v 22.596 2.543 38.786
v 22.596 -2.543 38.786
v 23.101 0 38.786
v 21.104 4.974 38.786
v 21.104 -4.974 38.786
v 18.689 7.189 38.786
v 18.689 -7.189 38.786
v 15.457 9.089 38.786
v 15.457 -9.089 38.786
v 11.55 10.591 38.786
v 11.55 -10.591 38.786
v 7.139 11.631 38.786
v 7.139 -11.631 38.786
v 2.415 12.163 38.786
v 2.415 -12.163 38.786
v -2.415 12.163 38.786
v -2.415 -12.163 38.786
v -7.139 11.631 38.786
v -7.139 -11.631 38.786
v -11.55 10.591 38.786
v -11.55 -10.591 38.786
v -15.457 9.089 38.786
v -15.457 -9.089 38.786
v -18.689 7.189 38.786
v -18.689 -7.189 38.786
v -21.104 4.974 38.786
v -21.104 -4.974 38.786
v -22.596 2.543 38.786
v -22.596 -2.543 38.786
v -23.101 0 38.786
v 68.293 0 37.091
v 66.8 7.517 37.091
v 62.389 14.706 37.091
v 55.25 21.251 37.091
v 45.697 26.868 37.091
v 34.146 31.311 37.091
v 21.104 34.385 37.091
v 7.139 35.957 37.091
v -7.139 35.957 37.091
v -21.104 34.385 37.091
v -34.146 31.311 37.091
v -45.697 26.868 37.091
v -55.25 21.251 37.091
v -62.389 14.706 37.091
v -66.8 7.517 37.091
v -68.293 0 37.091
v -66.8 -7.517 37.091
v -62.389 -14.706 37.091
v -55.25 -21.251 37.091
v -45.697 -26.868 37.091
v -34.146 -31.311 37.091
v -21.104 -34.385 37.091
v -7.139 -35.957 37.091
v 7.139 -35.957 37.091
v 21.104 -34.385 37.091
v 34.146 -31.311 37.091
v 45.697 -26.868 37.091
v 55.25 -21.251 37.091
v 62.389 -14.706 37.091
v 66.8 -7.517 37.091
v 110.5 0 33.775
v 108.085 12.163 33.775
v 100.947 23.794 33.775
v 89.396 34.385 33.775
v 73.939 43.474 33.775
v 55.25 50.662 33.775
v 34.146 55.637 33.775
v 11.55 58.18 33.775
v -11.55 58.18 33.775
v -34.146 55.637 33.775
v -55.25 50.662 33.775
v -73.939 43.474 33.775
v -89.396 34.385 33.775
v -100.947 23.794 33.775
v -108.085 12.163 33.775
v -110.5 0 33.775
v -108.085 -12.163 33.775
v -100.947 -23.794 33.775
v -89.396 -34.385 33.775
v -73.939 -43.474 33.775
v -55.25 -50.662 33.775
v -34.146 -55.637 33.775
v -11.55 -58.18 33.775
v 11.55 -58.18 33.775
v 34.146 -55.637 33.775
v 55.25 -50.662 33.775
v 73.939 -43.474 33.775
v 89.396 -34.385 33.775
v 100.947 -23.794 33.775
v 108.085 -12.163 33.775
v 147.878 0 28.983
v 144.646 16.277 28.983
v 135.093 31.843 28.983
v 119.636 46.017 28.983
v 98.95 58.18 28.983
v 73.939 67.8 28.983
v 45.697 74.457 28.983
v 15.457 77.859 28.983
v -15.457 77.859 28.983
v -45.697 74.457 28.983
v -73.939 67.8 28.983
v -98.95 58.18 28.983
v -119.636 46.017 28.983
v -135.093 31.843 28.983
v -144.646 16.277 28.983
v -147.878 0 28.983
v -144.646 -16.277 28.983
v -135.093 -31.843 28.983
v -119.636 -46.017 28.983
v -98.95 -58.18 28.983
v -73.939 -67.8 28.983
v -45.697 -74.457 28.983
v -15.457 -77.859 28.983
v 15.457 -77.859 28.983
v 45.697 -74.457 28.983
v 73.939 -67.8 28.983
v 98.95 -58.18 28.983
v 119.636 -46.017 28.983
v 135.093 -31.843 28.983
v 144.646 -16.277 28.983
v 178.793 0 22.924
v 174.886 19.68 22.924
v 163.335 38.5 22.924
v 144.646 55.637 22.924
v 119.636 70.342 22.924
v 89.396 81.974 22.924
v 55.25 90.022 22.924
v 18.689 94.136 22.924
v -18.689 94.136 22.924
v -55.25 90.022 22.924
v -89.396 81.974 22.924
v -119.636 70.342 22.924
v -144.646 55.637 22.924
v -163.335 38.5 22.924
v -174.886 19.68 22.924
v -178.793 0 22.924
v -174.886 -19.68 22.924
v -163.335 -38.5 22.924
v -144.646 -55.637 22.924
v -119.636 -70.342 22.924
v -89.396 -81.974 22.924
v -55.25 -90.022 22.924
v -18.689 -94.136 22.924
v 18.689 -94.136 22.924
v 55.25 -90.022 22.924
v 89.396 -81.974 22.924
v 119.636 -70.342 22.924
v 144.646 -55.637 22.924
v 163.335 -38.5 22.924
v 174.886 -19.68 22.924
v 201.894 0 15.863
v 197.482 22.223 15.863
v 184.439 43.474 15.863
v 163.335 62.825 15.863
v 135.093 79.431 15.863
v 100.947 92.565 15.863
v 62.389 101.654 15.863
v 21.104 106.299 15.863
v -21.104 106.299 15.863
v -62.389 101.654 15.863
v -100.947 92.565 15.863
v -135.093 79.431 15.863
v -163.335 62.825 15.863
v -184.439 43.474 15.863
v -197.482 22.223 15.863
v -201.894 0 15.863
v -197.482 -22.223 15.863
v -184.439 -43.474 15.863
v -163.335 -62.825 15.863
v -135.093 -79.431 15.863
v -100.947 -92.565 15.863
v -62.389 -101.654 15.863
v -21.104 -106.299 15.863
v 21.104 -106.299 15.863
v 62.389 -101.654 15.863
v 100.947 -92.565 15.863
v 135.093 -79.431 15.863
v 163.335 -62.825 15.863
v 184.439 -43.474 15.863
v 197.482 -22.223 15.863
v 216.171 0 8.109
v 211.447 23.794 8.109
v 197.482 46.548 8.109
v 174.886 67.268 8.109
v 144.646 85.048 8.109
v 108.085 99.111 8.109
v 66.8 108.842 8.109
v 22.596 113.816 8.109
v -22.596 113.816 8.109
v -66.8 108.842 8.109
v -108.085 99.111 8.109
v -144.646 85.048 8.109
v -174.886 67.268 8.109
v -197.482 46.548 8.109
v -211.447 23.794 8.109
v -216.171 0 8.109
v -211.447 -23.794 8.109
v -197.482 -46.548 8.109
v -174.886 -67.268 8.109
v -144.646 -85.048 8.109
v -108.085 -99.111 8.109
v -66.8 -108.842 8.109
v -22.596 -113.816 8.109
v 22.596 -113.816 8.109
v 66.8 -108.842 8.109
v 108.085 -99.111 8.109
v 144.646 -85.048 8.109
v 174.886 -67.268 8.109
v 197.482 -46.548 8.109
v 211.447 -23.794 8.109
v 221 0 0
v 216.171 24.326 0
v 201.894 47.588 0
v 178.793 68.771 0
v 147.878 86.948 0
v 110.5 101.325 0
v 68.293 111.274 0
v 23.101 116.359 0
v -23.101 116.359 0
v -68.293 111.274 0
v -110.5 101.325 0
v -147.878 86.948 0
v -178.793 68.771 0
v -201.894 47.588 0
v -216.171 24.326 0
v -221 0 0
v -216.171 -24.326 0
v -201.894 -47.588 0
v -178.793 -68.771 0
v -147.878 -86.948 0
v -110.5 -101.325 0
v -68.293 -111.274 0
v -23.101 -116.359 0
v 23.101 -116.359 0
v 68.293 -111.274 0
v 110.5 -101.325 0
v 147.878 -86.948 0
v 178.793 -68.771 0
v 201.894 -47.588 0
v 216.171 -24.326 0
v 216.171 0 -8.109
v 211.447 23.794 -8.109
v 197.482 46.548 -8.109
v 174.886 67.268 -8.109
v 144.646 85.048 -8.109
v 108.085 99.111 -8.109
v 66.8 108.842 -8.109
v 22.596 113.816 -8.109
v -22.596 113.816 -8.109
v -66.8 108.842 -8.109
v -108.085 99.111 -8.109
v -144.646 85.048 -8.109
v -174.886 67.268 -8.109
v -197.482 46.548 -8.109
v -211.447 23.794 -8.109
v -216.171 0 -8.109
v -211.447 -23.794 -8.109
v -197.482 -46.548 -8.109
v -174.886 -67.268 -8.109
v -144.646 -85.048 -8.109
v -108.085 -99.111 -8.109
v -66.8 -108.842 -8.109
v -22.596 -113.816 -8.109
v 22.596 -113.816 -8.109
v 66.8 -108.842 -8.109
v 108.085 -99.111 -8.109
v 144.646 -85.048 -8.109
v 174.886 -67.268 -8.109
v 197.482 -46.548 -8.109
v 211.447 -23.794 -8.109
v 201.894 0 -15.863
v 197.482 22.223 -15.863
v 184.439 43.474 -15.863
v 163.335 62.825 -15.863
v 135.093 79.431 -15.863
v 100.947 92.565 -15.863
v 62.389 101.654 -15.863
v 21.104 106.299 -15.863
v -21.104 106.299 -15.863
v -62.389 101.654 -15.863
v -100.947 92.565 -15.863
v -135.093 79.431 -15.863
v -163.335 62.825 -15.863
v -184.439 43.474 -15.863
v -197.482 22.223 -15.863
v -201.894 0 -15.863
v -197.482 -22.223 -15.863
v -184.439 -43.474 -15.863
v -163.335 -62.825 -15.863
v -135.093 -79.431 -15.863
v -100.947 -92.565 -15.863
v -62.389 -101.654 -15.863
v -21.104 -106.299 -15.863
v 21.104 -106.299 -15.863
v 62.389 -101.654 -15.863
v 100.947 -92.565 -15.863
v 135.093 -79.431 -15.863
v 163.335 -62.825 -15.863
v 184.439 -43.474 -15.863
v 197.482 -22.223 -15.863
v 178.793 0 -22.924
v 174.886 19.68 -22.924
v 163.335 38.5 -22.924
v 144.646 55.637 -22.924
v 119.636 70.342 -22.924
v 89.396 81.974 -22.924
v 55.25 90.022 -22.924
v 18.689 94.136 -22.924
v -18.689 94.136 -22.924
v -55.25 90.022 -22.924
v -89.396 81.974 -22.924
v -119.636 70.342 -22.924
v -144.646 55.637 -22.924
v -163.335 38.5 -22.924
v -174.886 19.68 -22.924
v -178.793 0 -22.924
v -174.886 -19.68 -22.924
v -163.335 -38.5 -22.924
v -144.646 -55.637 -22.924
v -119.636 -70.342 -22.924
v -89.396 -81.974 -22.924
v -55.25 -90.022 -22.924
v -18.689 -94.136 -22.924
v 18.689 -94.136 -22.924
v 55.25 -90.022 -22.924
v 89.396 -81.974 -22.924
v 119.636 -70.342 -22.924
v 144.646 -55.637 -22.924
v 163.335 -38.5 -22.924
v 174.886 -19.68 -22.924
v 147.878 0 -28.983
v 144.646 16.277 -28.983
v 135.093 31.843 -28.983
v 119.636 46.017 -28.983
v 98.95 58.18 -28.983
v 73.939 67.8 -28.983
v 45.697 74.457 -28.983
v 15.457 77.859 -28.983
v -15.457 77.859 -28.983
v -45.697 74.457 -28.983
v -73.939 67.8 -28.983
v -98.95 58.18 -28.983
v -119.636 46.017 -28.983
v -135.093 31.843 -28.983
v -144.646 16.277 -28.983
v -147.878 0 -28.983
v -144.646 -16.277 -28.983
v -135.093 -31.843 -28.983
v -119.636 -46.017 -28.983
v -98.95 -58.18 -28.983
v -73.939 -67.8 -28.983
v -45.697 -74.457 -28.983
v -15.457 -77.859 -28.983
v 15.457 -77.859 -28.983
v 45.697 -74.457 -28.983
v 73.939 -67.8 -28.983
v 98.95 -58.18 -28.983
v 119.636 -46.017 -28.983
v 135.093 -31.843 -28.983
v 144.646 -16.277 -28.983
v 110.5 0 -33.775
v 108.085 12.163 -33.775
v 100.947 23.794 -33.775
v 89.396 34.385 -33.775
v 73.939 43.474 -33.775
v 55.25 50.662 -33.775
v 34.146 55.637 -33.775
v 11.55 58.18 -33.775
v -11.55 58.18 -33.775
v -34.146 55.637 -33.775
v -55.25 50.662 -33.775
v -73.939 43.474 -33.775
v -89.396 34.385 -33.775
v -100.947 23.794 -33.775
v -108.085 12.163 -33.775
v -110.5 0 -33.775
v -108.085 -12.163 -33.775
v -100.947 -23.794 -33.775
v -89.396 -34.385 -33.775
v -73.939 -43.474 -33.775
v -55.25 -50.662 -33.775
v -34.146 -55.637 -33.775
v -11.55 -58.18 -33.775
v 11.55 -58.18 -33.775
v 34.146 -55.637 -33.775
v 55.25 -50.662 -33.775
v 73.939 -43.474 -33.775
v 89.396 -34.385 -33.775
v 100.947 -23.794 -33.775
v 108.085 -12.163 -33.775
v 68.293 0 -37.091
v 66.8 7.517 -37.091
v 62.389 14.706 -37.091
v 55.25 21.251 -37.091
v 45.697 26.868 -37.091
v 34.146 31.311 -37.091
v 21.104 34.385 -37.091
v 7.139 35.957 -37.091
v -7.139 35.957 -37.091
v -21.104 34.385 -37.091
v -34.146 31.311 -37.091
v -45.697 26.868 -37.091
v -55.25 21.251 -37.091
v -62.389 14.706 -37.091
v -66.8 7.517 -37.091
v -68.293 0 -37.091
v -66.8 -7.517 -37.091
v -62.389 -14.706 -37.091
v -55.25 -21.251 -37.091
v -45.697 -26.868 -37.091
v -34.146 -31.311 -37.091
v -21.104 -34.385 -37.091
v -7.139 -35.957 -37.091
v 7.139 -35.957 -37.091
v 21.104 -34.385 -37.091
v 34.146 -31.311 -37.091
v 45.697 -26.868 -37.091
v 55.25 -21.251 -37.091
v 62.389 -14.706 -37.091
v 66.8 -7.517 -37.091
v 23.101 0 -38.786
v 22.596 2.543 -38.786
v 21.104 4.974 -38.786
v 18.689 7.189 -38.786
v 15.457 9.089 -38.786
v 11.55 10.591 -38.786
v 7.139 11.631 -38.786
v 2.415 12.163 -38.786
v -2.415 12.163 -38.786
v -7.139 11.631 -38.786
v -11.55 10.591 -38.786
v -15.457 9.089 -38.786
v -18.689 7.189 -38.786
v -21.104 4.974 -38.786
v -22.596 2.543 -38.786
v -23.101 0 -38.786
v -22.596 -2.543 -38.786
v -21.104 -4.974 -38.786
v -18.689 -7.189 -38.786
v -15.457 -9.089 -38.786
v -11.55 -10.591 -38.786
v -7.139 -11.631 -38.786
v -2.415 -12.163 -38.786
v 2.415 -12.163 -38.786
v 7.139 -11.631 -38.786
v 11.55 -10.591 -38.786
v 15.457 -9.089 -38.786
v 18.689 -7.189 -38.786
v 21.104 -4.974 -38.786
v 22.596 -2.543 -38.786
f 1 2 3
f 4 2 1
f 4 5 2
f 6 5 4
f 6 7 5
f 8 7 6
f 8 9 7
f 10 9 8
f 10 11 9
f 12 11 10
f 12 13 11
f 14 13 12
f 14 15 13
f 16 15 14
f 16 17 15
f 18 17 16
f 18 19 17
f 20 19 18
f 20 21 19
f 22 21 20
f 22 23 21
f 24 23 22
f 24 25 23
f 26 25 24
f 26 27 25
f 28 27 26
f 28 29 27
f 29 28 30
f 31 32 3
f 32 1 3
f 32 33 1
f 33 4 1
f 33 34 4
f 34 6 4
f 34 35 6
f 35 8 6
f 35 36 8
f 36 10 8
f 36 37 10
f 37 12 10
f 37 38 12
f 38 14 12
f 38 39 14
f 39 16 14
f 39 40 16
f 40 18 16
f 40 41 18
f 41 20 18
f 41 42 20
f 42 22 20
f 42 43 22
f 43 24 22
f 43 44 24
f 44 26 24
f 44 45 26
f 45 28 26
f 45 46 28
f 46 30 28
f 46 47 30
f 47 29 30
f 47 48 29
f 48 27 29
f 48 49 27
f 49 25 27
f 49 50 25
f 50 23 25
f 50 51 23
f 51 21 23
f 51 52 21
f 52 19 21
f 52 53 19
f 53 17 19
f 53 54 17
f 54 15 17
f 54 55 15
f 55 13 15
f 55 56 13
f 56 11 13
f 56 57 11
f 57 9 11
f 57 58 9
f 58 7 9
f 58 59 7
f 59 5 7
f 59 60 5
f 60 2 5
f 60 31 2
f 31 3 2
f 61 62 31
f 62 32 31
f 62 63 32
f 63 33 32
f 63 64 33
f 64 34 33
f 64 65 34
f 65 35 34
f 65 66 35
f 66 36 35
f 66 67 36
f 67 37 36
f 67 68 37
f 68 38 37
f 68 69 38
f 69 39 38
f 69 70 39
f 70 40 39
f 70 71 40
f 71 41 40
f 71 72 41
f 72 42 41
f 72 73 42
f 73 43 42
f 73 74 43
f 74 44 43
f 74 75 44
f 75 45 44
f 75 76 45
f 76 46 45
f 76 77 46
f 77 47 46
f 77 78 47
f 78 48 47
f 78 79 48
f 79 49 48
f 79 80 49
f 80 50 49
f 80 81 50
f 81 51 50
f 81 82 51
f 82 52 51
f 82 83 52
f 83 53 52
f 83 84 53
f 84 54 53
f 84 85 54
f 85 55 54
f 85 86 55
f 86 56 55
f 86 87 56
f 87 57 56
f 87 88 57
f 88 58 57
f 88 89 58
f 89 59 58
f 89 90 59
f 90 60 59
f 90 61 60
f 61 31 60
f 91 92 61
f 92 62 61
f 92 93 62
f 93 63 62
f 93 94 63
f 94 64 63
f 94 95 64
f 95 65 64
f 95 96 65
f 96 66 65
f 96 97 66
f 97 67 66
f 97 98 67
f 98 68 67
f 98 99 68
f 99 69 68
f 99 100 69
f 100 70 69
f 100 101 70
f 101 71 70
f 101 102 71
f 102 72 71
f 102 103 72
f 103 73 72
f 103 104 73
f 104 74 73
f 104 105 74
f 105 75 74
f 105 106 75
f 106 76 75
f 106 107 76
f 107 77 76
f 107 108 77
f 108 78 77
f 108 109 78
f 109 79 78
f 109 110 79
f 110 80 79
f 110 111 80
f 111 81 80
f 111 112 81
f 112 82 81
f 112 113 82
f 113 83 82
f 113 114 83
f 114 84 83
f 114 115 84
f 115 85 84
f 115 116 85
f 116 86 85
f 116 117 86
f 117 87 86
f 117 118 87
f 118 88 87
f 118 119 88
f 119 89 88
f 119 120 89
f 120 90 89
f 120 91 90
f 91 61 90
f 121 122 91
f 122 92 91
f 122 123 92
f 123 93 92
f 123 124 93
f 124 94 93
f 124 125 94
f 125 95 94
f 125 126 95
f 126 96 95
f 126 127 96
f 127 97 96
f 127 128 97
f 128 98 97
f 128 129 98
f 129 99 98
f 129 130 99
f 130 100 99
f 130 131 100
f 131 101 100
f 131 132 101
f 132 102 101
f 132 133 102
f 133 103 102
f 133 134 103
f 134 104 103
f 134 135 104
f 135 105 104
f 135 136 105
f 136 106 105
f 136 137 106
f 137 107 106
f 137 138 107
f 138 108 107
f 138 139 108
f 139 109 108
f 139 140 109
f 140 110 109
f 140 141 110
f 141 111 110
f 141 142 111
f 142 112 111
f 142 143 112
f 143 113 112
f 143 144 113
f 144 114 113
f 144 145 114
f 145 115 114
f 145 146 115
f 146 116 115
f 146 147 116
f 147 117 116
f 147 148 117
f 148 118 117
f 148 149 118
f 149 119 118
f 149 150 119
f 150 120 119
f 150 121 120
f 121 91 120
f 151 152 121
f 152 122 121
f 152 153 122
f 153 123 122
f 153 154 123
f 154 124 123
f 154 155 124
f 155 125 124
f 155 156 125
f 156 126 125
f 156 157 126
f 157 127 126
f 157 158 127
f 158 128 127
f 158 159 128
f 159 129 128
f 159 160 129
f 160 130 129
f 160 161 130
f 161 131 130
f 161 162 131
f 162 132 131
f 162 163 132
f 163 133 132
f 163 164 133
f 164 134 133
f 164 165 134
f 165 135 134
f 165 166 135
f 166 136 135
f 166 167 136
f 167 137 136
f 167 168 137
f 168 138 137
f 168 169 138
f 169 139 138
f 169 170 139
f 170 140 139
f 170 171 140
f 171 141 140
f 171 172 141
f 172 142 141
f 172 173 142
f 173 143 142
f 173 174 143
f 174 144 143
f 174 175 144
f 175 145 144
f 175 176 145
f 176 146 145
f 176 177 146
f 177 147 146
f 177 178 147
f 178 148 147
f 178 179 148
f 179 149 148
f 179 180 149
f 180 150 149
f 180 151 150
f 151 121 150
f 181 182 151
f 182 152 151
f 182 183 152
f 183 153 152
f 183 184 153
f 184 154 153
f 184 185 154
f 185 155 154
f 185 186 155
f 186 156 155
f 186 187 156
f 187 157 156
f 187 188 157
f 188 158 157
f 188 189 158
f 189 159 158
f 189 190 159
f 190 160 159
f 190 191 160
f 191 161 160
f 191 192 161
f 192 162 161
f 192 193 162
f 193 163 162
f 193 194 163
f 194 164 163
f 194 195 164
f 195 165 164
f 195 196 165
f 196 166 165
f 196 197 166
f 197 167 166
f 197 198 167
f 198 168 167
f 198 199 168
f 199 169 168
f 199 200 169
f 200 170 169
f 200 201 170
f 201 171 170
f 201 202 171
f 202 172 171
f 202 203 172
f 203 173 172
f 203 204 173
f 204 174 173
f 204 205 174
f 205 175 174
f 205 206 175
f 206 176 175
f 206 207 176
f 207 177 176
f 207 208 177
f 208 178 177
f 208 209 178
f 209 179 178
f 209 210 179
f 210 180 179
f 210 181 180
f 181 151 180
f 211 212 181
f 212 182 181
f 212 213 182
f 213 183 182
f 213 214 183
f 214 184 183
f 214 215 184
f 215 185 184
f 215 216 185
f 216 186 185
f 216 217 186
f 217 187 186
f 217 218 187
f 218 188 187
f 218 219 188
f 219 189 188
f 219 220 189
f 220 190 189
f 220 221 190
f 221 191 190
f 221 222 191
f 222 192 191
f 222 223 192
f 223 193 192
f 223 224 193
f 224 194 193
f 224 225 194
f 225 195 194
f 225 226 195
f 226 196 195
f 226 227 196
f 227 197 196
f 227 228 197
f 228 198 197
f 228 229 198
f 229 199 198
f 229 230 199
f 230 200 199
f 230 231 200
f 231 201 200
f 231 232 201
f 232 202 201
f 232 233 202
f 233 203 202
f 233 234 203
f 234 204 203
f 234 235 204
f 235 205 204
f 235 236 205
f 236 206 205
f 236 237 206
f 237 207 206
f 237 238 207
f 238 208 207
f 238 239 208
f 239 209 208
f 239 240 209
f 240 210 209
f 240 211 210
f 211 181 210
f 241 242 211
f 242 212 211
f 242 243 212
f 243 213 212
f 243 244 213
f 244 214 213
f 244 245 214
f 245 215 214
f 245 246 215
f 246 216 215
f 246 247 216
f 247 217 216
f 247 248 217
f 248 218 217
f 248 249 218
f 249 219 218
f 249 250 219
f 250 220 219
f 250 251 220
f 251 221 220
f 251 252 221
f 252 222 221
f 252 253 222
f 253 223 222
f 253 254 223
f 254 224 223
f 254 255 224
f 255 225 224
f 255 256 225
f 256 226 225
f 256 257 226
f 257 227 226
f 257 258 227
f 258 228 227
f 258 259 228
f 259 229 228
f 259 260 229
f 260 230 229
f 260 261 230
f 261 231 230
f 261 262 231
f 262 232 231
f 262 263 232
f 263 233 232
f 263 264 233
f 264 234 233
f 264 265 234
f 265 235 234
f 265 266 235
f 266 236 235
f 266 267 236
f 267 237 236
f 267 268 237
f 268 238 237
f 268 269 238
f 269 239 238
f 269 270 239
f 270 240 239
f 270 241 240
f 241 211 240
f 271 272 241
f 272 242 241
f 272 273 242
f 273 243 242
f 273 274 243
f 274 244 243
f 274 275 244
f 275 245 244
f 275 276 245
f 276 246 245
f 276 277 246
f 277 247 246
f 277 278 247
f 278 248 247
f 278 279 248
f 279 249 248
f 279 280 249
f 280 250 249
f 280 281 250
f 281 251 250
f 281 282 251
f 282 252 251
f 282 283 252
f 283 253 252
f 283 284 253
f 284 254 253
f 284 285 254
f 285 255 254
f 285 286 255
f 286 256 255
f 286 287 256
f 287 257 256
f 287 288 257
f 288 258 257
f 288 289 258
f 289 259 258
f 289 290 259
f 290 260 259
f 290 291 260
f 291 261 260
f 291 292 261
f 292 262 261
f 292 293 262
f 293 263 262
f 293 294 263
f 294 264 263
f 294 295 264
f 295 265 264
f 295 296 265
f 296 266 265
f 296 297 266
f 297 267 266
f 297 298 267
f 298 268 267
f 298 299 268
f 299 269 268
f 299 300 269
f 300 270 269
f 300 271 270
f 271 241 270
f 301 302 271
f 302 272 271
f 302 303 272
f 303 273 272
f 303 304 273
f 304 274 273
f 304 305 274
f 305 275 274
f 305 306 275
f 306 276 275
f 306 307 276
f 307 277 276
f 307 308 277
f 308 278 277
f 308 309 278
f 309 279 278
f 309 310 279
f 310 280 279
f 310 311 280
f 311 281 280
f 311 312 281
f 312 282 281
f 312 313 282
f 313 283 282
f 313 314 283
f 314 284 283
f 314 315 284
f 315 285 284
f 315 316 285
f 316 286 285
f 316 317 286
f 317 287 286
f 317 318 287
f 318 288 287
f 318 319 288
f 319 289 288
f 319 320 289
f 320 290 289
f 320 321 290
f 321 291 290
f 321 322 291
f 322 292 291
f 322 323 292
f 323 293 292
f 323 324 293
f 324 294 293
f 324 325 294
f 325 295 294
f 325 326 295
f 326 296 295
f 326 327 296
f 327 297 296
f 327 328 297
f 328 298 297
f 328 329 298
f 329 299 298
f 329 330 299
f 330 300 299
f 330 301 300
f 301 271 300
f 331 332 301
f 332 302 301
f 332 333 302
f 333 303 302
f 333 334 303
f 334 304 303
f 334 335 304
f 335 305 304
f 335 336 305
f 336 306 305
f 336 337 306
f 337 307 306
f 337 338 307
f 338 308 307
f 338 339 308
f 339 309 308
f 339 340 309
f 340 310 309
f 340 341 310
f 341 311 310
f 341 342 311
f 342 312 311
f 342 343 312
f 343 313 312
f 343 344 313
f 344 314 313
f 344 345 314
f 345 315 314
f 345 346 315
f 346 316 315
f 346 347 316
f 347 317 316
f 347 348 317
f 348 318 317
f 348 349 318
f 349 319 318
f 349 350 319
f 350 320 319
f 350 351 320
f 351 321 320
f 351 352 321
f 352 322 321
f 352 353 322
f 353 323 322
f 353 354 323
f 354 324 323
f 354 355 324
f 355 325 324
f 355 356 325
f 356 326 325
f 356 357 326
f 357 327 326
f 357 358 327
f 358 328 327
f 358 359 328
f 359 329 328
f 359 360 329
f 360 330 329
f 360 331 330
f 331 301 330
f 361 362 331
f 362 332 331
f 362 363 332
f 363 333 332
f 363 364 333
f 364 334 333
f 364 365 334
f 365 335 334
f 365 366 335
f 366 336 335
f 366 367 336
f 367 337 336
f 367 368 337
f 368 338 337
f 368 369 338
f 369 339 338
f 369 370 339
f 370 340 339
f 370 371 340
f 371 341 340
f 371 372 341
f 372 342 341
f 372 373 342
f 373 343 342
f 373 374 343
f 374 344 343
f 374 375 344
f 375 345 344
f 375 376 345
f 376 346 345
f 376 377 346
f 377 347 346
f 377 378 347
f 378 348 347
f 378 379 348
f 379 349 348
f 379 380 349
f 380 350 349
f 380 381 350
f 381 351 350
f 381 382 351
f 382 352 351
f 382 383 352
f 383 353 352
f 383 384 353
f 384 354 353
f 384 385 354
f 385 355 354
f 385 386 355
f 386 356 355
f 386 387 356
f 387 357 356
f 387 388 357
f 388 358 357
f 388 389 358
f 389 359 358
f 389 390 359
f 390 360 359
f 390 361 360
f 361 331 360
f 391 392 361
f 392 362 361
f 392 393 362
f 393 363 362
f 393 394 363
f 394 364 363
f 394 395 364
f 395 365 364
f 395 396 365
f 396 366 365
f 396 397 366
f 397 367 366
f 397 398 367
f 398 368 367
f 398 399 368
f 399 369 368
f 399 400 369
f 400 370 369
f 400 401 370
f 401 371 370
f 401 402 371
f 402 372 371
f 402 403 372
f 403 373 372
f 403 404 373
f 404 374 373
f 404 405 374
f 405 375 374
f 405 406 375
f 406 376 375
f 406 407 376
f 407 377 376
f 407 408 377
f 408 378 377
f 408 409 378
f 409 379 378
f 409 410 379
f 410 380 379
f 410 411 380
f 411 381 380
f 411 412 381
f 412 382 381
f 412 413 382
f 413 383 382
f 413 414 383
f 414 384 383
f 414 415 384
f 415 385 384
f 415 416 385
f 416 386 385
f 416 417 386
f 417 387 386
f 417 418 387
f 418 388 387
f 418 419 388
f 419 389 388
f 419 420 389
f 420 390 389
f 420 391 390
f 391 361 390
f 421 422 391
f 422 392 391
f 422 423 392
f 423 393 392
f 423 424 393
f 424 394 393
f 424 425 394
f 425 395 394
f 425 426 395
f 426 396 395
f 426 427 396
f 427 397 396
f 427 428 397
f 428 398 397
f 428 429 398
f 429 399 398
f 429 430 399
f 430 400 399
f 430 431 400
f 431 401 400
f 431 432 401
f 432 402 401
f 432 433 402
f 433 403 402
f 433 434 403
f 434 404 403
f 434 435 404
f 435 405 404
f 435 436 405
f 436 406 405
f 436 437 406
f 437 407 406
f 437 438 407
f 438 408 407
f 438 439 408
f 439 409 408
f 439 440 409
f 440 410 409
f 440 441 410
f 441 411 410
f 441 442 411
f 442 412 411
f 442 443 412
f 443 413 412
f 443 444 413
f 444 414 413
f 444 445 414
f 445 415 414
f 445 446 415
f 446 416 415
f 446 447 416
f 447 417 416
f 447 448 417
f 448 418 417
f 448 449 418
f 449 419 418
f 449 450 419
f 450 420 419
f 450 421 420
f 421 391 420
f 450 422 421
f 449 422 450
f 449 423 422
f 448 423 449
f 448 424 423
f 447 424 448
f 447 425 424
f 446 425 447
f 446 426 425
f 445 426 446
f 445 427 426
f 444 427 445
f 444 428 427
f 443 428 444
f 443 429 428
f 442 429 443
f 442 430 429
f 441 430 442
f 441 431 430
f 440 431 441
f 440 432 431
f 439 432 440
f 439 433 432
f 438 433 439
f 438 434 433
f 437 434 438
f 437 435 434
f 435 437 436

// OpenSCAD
// Generated by SolidPython 1.0.1 on 2020-07-29 00:46:53


scale(v = [17, 9, 3]) {
	sphere(r = 13);
}
/***********************************************
*********      SolidPython code:      **********
************************************************
 
# import packages: SolidPython
from solid import *
from solid.utils import *
from itertools import chain, combinations, permutations


class Resize:

    def __init__(self, scad_file):
        self.scad_file = scad_file
        #self.scad_file = import_scad(scad_file)
        # cone/cylinder param:
        self.r1 = 0
        self.r2 = 0
        self.h = 0
        # rectangular prism param:
        self.w = 0
        self.l = 0
        # ellipse param:
        self.r = 0

    # import OpenScad code (file name corresponds to shape)


    # classify shape + parameters
    def assign(self, param1, param2, param3):
        if self.scad_file == 'cone.scad':
            self.r1 = param1
            self.r2 = param2
            self.h = param3
        elif self.scad_file == 'cylinder.scad':
            self.r1 = param1
            self.r2 = param2
            self.h = param3
        elif self.scad_file == 'rectangularPrism.scad':
            self.h = param1
            self.l = param2
            self.w = param3
        else:
            self.r = param1
            self.h = param2

    # resize parameters
    def iterate(self):
        x = range(3, 20, 2)
        i = 1
        if self.scad_file == 'cone.scad':
            tempList = list(permutations(x, 2))
            for temp in tempList:
                param1 = temp[0]
                param2 = temp[1]
                filepath = 'produced_scad_files/' + 'cone' + str(param1) + '_' + str(param2) + '_' + '.scad'
                scad_render_to_file(cylinder(h=param1, r1=param2, r2=0), filepath)

        elif self.scad_file == 'cylinder.scad':
            tempList = list(permutations(x, 3))
            for temp in tempList:
                param1 = temp[0]
                param2 = temp[1]
                filepath = 'produced_scad_files/' + 'cylinder' + str(param1) + '_' + str(param2) + '_' + '.scad'
                scad_render_to_file(cylinder(h=param1, r1=param2, r2=param2), filepath)

        elif self.scad_file == 'rectangularPrism.scad':
            tempList = list(permutations(x, 3))
            for temp in tempList:
                param1 = temp[0]
                param2 = temp[1]
                param3 = temp[2]
                filepath = 'produced_scad_files/' + 'rectangularPrism' + str(param1) + '_' + str(param2) + '_' + str(
                    param3) + '.scad'
                scad_render_to_file(cube(size=(param1, param2, param3)), filepath)

        elif self.scad_file == 'ellipse.scad':
            tempList = list(permutations(x, 4))
            for temp in tempList:
                param1 = temp[0]
                param2 = temp[1]
                param3 = temp[2]
                param4 = temp[3]
                filepath = 'produced_scad_files/' + 'ellipse' + str(param1) + '_' + str(param2) + '_' + str(param3) + '_' + str(param4) + '.scad'
                scad_render_to_file(scale([param1, param2, param3])(sphere(r=param4)), filepath)

    def render_to_scadfile(self):
        scad_render_to_file(scad, 'example.scad') 
 
************************************************/
